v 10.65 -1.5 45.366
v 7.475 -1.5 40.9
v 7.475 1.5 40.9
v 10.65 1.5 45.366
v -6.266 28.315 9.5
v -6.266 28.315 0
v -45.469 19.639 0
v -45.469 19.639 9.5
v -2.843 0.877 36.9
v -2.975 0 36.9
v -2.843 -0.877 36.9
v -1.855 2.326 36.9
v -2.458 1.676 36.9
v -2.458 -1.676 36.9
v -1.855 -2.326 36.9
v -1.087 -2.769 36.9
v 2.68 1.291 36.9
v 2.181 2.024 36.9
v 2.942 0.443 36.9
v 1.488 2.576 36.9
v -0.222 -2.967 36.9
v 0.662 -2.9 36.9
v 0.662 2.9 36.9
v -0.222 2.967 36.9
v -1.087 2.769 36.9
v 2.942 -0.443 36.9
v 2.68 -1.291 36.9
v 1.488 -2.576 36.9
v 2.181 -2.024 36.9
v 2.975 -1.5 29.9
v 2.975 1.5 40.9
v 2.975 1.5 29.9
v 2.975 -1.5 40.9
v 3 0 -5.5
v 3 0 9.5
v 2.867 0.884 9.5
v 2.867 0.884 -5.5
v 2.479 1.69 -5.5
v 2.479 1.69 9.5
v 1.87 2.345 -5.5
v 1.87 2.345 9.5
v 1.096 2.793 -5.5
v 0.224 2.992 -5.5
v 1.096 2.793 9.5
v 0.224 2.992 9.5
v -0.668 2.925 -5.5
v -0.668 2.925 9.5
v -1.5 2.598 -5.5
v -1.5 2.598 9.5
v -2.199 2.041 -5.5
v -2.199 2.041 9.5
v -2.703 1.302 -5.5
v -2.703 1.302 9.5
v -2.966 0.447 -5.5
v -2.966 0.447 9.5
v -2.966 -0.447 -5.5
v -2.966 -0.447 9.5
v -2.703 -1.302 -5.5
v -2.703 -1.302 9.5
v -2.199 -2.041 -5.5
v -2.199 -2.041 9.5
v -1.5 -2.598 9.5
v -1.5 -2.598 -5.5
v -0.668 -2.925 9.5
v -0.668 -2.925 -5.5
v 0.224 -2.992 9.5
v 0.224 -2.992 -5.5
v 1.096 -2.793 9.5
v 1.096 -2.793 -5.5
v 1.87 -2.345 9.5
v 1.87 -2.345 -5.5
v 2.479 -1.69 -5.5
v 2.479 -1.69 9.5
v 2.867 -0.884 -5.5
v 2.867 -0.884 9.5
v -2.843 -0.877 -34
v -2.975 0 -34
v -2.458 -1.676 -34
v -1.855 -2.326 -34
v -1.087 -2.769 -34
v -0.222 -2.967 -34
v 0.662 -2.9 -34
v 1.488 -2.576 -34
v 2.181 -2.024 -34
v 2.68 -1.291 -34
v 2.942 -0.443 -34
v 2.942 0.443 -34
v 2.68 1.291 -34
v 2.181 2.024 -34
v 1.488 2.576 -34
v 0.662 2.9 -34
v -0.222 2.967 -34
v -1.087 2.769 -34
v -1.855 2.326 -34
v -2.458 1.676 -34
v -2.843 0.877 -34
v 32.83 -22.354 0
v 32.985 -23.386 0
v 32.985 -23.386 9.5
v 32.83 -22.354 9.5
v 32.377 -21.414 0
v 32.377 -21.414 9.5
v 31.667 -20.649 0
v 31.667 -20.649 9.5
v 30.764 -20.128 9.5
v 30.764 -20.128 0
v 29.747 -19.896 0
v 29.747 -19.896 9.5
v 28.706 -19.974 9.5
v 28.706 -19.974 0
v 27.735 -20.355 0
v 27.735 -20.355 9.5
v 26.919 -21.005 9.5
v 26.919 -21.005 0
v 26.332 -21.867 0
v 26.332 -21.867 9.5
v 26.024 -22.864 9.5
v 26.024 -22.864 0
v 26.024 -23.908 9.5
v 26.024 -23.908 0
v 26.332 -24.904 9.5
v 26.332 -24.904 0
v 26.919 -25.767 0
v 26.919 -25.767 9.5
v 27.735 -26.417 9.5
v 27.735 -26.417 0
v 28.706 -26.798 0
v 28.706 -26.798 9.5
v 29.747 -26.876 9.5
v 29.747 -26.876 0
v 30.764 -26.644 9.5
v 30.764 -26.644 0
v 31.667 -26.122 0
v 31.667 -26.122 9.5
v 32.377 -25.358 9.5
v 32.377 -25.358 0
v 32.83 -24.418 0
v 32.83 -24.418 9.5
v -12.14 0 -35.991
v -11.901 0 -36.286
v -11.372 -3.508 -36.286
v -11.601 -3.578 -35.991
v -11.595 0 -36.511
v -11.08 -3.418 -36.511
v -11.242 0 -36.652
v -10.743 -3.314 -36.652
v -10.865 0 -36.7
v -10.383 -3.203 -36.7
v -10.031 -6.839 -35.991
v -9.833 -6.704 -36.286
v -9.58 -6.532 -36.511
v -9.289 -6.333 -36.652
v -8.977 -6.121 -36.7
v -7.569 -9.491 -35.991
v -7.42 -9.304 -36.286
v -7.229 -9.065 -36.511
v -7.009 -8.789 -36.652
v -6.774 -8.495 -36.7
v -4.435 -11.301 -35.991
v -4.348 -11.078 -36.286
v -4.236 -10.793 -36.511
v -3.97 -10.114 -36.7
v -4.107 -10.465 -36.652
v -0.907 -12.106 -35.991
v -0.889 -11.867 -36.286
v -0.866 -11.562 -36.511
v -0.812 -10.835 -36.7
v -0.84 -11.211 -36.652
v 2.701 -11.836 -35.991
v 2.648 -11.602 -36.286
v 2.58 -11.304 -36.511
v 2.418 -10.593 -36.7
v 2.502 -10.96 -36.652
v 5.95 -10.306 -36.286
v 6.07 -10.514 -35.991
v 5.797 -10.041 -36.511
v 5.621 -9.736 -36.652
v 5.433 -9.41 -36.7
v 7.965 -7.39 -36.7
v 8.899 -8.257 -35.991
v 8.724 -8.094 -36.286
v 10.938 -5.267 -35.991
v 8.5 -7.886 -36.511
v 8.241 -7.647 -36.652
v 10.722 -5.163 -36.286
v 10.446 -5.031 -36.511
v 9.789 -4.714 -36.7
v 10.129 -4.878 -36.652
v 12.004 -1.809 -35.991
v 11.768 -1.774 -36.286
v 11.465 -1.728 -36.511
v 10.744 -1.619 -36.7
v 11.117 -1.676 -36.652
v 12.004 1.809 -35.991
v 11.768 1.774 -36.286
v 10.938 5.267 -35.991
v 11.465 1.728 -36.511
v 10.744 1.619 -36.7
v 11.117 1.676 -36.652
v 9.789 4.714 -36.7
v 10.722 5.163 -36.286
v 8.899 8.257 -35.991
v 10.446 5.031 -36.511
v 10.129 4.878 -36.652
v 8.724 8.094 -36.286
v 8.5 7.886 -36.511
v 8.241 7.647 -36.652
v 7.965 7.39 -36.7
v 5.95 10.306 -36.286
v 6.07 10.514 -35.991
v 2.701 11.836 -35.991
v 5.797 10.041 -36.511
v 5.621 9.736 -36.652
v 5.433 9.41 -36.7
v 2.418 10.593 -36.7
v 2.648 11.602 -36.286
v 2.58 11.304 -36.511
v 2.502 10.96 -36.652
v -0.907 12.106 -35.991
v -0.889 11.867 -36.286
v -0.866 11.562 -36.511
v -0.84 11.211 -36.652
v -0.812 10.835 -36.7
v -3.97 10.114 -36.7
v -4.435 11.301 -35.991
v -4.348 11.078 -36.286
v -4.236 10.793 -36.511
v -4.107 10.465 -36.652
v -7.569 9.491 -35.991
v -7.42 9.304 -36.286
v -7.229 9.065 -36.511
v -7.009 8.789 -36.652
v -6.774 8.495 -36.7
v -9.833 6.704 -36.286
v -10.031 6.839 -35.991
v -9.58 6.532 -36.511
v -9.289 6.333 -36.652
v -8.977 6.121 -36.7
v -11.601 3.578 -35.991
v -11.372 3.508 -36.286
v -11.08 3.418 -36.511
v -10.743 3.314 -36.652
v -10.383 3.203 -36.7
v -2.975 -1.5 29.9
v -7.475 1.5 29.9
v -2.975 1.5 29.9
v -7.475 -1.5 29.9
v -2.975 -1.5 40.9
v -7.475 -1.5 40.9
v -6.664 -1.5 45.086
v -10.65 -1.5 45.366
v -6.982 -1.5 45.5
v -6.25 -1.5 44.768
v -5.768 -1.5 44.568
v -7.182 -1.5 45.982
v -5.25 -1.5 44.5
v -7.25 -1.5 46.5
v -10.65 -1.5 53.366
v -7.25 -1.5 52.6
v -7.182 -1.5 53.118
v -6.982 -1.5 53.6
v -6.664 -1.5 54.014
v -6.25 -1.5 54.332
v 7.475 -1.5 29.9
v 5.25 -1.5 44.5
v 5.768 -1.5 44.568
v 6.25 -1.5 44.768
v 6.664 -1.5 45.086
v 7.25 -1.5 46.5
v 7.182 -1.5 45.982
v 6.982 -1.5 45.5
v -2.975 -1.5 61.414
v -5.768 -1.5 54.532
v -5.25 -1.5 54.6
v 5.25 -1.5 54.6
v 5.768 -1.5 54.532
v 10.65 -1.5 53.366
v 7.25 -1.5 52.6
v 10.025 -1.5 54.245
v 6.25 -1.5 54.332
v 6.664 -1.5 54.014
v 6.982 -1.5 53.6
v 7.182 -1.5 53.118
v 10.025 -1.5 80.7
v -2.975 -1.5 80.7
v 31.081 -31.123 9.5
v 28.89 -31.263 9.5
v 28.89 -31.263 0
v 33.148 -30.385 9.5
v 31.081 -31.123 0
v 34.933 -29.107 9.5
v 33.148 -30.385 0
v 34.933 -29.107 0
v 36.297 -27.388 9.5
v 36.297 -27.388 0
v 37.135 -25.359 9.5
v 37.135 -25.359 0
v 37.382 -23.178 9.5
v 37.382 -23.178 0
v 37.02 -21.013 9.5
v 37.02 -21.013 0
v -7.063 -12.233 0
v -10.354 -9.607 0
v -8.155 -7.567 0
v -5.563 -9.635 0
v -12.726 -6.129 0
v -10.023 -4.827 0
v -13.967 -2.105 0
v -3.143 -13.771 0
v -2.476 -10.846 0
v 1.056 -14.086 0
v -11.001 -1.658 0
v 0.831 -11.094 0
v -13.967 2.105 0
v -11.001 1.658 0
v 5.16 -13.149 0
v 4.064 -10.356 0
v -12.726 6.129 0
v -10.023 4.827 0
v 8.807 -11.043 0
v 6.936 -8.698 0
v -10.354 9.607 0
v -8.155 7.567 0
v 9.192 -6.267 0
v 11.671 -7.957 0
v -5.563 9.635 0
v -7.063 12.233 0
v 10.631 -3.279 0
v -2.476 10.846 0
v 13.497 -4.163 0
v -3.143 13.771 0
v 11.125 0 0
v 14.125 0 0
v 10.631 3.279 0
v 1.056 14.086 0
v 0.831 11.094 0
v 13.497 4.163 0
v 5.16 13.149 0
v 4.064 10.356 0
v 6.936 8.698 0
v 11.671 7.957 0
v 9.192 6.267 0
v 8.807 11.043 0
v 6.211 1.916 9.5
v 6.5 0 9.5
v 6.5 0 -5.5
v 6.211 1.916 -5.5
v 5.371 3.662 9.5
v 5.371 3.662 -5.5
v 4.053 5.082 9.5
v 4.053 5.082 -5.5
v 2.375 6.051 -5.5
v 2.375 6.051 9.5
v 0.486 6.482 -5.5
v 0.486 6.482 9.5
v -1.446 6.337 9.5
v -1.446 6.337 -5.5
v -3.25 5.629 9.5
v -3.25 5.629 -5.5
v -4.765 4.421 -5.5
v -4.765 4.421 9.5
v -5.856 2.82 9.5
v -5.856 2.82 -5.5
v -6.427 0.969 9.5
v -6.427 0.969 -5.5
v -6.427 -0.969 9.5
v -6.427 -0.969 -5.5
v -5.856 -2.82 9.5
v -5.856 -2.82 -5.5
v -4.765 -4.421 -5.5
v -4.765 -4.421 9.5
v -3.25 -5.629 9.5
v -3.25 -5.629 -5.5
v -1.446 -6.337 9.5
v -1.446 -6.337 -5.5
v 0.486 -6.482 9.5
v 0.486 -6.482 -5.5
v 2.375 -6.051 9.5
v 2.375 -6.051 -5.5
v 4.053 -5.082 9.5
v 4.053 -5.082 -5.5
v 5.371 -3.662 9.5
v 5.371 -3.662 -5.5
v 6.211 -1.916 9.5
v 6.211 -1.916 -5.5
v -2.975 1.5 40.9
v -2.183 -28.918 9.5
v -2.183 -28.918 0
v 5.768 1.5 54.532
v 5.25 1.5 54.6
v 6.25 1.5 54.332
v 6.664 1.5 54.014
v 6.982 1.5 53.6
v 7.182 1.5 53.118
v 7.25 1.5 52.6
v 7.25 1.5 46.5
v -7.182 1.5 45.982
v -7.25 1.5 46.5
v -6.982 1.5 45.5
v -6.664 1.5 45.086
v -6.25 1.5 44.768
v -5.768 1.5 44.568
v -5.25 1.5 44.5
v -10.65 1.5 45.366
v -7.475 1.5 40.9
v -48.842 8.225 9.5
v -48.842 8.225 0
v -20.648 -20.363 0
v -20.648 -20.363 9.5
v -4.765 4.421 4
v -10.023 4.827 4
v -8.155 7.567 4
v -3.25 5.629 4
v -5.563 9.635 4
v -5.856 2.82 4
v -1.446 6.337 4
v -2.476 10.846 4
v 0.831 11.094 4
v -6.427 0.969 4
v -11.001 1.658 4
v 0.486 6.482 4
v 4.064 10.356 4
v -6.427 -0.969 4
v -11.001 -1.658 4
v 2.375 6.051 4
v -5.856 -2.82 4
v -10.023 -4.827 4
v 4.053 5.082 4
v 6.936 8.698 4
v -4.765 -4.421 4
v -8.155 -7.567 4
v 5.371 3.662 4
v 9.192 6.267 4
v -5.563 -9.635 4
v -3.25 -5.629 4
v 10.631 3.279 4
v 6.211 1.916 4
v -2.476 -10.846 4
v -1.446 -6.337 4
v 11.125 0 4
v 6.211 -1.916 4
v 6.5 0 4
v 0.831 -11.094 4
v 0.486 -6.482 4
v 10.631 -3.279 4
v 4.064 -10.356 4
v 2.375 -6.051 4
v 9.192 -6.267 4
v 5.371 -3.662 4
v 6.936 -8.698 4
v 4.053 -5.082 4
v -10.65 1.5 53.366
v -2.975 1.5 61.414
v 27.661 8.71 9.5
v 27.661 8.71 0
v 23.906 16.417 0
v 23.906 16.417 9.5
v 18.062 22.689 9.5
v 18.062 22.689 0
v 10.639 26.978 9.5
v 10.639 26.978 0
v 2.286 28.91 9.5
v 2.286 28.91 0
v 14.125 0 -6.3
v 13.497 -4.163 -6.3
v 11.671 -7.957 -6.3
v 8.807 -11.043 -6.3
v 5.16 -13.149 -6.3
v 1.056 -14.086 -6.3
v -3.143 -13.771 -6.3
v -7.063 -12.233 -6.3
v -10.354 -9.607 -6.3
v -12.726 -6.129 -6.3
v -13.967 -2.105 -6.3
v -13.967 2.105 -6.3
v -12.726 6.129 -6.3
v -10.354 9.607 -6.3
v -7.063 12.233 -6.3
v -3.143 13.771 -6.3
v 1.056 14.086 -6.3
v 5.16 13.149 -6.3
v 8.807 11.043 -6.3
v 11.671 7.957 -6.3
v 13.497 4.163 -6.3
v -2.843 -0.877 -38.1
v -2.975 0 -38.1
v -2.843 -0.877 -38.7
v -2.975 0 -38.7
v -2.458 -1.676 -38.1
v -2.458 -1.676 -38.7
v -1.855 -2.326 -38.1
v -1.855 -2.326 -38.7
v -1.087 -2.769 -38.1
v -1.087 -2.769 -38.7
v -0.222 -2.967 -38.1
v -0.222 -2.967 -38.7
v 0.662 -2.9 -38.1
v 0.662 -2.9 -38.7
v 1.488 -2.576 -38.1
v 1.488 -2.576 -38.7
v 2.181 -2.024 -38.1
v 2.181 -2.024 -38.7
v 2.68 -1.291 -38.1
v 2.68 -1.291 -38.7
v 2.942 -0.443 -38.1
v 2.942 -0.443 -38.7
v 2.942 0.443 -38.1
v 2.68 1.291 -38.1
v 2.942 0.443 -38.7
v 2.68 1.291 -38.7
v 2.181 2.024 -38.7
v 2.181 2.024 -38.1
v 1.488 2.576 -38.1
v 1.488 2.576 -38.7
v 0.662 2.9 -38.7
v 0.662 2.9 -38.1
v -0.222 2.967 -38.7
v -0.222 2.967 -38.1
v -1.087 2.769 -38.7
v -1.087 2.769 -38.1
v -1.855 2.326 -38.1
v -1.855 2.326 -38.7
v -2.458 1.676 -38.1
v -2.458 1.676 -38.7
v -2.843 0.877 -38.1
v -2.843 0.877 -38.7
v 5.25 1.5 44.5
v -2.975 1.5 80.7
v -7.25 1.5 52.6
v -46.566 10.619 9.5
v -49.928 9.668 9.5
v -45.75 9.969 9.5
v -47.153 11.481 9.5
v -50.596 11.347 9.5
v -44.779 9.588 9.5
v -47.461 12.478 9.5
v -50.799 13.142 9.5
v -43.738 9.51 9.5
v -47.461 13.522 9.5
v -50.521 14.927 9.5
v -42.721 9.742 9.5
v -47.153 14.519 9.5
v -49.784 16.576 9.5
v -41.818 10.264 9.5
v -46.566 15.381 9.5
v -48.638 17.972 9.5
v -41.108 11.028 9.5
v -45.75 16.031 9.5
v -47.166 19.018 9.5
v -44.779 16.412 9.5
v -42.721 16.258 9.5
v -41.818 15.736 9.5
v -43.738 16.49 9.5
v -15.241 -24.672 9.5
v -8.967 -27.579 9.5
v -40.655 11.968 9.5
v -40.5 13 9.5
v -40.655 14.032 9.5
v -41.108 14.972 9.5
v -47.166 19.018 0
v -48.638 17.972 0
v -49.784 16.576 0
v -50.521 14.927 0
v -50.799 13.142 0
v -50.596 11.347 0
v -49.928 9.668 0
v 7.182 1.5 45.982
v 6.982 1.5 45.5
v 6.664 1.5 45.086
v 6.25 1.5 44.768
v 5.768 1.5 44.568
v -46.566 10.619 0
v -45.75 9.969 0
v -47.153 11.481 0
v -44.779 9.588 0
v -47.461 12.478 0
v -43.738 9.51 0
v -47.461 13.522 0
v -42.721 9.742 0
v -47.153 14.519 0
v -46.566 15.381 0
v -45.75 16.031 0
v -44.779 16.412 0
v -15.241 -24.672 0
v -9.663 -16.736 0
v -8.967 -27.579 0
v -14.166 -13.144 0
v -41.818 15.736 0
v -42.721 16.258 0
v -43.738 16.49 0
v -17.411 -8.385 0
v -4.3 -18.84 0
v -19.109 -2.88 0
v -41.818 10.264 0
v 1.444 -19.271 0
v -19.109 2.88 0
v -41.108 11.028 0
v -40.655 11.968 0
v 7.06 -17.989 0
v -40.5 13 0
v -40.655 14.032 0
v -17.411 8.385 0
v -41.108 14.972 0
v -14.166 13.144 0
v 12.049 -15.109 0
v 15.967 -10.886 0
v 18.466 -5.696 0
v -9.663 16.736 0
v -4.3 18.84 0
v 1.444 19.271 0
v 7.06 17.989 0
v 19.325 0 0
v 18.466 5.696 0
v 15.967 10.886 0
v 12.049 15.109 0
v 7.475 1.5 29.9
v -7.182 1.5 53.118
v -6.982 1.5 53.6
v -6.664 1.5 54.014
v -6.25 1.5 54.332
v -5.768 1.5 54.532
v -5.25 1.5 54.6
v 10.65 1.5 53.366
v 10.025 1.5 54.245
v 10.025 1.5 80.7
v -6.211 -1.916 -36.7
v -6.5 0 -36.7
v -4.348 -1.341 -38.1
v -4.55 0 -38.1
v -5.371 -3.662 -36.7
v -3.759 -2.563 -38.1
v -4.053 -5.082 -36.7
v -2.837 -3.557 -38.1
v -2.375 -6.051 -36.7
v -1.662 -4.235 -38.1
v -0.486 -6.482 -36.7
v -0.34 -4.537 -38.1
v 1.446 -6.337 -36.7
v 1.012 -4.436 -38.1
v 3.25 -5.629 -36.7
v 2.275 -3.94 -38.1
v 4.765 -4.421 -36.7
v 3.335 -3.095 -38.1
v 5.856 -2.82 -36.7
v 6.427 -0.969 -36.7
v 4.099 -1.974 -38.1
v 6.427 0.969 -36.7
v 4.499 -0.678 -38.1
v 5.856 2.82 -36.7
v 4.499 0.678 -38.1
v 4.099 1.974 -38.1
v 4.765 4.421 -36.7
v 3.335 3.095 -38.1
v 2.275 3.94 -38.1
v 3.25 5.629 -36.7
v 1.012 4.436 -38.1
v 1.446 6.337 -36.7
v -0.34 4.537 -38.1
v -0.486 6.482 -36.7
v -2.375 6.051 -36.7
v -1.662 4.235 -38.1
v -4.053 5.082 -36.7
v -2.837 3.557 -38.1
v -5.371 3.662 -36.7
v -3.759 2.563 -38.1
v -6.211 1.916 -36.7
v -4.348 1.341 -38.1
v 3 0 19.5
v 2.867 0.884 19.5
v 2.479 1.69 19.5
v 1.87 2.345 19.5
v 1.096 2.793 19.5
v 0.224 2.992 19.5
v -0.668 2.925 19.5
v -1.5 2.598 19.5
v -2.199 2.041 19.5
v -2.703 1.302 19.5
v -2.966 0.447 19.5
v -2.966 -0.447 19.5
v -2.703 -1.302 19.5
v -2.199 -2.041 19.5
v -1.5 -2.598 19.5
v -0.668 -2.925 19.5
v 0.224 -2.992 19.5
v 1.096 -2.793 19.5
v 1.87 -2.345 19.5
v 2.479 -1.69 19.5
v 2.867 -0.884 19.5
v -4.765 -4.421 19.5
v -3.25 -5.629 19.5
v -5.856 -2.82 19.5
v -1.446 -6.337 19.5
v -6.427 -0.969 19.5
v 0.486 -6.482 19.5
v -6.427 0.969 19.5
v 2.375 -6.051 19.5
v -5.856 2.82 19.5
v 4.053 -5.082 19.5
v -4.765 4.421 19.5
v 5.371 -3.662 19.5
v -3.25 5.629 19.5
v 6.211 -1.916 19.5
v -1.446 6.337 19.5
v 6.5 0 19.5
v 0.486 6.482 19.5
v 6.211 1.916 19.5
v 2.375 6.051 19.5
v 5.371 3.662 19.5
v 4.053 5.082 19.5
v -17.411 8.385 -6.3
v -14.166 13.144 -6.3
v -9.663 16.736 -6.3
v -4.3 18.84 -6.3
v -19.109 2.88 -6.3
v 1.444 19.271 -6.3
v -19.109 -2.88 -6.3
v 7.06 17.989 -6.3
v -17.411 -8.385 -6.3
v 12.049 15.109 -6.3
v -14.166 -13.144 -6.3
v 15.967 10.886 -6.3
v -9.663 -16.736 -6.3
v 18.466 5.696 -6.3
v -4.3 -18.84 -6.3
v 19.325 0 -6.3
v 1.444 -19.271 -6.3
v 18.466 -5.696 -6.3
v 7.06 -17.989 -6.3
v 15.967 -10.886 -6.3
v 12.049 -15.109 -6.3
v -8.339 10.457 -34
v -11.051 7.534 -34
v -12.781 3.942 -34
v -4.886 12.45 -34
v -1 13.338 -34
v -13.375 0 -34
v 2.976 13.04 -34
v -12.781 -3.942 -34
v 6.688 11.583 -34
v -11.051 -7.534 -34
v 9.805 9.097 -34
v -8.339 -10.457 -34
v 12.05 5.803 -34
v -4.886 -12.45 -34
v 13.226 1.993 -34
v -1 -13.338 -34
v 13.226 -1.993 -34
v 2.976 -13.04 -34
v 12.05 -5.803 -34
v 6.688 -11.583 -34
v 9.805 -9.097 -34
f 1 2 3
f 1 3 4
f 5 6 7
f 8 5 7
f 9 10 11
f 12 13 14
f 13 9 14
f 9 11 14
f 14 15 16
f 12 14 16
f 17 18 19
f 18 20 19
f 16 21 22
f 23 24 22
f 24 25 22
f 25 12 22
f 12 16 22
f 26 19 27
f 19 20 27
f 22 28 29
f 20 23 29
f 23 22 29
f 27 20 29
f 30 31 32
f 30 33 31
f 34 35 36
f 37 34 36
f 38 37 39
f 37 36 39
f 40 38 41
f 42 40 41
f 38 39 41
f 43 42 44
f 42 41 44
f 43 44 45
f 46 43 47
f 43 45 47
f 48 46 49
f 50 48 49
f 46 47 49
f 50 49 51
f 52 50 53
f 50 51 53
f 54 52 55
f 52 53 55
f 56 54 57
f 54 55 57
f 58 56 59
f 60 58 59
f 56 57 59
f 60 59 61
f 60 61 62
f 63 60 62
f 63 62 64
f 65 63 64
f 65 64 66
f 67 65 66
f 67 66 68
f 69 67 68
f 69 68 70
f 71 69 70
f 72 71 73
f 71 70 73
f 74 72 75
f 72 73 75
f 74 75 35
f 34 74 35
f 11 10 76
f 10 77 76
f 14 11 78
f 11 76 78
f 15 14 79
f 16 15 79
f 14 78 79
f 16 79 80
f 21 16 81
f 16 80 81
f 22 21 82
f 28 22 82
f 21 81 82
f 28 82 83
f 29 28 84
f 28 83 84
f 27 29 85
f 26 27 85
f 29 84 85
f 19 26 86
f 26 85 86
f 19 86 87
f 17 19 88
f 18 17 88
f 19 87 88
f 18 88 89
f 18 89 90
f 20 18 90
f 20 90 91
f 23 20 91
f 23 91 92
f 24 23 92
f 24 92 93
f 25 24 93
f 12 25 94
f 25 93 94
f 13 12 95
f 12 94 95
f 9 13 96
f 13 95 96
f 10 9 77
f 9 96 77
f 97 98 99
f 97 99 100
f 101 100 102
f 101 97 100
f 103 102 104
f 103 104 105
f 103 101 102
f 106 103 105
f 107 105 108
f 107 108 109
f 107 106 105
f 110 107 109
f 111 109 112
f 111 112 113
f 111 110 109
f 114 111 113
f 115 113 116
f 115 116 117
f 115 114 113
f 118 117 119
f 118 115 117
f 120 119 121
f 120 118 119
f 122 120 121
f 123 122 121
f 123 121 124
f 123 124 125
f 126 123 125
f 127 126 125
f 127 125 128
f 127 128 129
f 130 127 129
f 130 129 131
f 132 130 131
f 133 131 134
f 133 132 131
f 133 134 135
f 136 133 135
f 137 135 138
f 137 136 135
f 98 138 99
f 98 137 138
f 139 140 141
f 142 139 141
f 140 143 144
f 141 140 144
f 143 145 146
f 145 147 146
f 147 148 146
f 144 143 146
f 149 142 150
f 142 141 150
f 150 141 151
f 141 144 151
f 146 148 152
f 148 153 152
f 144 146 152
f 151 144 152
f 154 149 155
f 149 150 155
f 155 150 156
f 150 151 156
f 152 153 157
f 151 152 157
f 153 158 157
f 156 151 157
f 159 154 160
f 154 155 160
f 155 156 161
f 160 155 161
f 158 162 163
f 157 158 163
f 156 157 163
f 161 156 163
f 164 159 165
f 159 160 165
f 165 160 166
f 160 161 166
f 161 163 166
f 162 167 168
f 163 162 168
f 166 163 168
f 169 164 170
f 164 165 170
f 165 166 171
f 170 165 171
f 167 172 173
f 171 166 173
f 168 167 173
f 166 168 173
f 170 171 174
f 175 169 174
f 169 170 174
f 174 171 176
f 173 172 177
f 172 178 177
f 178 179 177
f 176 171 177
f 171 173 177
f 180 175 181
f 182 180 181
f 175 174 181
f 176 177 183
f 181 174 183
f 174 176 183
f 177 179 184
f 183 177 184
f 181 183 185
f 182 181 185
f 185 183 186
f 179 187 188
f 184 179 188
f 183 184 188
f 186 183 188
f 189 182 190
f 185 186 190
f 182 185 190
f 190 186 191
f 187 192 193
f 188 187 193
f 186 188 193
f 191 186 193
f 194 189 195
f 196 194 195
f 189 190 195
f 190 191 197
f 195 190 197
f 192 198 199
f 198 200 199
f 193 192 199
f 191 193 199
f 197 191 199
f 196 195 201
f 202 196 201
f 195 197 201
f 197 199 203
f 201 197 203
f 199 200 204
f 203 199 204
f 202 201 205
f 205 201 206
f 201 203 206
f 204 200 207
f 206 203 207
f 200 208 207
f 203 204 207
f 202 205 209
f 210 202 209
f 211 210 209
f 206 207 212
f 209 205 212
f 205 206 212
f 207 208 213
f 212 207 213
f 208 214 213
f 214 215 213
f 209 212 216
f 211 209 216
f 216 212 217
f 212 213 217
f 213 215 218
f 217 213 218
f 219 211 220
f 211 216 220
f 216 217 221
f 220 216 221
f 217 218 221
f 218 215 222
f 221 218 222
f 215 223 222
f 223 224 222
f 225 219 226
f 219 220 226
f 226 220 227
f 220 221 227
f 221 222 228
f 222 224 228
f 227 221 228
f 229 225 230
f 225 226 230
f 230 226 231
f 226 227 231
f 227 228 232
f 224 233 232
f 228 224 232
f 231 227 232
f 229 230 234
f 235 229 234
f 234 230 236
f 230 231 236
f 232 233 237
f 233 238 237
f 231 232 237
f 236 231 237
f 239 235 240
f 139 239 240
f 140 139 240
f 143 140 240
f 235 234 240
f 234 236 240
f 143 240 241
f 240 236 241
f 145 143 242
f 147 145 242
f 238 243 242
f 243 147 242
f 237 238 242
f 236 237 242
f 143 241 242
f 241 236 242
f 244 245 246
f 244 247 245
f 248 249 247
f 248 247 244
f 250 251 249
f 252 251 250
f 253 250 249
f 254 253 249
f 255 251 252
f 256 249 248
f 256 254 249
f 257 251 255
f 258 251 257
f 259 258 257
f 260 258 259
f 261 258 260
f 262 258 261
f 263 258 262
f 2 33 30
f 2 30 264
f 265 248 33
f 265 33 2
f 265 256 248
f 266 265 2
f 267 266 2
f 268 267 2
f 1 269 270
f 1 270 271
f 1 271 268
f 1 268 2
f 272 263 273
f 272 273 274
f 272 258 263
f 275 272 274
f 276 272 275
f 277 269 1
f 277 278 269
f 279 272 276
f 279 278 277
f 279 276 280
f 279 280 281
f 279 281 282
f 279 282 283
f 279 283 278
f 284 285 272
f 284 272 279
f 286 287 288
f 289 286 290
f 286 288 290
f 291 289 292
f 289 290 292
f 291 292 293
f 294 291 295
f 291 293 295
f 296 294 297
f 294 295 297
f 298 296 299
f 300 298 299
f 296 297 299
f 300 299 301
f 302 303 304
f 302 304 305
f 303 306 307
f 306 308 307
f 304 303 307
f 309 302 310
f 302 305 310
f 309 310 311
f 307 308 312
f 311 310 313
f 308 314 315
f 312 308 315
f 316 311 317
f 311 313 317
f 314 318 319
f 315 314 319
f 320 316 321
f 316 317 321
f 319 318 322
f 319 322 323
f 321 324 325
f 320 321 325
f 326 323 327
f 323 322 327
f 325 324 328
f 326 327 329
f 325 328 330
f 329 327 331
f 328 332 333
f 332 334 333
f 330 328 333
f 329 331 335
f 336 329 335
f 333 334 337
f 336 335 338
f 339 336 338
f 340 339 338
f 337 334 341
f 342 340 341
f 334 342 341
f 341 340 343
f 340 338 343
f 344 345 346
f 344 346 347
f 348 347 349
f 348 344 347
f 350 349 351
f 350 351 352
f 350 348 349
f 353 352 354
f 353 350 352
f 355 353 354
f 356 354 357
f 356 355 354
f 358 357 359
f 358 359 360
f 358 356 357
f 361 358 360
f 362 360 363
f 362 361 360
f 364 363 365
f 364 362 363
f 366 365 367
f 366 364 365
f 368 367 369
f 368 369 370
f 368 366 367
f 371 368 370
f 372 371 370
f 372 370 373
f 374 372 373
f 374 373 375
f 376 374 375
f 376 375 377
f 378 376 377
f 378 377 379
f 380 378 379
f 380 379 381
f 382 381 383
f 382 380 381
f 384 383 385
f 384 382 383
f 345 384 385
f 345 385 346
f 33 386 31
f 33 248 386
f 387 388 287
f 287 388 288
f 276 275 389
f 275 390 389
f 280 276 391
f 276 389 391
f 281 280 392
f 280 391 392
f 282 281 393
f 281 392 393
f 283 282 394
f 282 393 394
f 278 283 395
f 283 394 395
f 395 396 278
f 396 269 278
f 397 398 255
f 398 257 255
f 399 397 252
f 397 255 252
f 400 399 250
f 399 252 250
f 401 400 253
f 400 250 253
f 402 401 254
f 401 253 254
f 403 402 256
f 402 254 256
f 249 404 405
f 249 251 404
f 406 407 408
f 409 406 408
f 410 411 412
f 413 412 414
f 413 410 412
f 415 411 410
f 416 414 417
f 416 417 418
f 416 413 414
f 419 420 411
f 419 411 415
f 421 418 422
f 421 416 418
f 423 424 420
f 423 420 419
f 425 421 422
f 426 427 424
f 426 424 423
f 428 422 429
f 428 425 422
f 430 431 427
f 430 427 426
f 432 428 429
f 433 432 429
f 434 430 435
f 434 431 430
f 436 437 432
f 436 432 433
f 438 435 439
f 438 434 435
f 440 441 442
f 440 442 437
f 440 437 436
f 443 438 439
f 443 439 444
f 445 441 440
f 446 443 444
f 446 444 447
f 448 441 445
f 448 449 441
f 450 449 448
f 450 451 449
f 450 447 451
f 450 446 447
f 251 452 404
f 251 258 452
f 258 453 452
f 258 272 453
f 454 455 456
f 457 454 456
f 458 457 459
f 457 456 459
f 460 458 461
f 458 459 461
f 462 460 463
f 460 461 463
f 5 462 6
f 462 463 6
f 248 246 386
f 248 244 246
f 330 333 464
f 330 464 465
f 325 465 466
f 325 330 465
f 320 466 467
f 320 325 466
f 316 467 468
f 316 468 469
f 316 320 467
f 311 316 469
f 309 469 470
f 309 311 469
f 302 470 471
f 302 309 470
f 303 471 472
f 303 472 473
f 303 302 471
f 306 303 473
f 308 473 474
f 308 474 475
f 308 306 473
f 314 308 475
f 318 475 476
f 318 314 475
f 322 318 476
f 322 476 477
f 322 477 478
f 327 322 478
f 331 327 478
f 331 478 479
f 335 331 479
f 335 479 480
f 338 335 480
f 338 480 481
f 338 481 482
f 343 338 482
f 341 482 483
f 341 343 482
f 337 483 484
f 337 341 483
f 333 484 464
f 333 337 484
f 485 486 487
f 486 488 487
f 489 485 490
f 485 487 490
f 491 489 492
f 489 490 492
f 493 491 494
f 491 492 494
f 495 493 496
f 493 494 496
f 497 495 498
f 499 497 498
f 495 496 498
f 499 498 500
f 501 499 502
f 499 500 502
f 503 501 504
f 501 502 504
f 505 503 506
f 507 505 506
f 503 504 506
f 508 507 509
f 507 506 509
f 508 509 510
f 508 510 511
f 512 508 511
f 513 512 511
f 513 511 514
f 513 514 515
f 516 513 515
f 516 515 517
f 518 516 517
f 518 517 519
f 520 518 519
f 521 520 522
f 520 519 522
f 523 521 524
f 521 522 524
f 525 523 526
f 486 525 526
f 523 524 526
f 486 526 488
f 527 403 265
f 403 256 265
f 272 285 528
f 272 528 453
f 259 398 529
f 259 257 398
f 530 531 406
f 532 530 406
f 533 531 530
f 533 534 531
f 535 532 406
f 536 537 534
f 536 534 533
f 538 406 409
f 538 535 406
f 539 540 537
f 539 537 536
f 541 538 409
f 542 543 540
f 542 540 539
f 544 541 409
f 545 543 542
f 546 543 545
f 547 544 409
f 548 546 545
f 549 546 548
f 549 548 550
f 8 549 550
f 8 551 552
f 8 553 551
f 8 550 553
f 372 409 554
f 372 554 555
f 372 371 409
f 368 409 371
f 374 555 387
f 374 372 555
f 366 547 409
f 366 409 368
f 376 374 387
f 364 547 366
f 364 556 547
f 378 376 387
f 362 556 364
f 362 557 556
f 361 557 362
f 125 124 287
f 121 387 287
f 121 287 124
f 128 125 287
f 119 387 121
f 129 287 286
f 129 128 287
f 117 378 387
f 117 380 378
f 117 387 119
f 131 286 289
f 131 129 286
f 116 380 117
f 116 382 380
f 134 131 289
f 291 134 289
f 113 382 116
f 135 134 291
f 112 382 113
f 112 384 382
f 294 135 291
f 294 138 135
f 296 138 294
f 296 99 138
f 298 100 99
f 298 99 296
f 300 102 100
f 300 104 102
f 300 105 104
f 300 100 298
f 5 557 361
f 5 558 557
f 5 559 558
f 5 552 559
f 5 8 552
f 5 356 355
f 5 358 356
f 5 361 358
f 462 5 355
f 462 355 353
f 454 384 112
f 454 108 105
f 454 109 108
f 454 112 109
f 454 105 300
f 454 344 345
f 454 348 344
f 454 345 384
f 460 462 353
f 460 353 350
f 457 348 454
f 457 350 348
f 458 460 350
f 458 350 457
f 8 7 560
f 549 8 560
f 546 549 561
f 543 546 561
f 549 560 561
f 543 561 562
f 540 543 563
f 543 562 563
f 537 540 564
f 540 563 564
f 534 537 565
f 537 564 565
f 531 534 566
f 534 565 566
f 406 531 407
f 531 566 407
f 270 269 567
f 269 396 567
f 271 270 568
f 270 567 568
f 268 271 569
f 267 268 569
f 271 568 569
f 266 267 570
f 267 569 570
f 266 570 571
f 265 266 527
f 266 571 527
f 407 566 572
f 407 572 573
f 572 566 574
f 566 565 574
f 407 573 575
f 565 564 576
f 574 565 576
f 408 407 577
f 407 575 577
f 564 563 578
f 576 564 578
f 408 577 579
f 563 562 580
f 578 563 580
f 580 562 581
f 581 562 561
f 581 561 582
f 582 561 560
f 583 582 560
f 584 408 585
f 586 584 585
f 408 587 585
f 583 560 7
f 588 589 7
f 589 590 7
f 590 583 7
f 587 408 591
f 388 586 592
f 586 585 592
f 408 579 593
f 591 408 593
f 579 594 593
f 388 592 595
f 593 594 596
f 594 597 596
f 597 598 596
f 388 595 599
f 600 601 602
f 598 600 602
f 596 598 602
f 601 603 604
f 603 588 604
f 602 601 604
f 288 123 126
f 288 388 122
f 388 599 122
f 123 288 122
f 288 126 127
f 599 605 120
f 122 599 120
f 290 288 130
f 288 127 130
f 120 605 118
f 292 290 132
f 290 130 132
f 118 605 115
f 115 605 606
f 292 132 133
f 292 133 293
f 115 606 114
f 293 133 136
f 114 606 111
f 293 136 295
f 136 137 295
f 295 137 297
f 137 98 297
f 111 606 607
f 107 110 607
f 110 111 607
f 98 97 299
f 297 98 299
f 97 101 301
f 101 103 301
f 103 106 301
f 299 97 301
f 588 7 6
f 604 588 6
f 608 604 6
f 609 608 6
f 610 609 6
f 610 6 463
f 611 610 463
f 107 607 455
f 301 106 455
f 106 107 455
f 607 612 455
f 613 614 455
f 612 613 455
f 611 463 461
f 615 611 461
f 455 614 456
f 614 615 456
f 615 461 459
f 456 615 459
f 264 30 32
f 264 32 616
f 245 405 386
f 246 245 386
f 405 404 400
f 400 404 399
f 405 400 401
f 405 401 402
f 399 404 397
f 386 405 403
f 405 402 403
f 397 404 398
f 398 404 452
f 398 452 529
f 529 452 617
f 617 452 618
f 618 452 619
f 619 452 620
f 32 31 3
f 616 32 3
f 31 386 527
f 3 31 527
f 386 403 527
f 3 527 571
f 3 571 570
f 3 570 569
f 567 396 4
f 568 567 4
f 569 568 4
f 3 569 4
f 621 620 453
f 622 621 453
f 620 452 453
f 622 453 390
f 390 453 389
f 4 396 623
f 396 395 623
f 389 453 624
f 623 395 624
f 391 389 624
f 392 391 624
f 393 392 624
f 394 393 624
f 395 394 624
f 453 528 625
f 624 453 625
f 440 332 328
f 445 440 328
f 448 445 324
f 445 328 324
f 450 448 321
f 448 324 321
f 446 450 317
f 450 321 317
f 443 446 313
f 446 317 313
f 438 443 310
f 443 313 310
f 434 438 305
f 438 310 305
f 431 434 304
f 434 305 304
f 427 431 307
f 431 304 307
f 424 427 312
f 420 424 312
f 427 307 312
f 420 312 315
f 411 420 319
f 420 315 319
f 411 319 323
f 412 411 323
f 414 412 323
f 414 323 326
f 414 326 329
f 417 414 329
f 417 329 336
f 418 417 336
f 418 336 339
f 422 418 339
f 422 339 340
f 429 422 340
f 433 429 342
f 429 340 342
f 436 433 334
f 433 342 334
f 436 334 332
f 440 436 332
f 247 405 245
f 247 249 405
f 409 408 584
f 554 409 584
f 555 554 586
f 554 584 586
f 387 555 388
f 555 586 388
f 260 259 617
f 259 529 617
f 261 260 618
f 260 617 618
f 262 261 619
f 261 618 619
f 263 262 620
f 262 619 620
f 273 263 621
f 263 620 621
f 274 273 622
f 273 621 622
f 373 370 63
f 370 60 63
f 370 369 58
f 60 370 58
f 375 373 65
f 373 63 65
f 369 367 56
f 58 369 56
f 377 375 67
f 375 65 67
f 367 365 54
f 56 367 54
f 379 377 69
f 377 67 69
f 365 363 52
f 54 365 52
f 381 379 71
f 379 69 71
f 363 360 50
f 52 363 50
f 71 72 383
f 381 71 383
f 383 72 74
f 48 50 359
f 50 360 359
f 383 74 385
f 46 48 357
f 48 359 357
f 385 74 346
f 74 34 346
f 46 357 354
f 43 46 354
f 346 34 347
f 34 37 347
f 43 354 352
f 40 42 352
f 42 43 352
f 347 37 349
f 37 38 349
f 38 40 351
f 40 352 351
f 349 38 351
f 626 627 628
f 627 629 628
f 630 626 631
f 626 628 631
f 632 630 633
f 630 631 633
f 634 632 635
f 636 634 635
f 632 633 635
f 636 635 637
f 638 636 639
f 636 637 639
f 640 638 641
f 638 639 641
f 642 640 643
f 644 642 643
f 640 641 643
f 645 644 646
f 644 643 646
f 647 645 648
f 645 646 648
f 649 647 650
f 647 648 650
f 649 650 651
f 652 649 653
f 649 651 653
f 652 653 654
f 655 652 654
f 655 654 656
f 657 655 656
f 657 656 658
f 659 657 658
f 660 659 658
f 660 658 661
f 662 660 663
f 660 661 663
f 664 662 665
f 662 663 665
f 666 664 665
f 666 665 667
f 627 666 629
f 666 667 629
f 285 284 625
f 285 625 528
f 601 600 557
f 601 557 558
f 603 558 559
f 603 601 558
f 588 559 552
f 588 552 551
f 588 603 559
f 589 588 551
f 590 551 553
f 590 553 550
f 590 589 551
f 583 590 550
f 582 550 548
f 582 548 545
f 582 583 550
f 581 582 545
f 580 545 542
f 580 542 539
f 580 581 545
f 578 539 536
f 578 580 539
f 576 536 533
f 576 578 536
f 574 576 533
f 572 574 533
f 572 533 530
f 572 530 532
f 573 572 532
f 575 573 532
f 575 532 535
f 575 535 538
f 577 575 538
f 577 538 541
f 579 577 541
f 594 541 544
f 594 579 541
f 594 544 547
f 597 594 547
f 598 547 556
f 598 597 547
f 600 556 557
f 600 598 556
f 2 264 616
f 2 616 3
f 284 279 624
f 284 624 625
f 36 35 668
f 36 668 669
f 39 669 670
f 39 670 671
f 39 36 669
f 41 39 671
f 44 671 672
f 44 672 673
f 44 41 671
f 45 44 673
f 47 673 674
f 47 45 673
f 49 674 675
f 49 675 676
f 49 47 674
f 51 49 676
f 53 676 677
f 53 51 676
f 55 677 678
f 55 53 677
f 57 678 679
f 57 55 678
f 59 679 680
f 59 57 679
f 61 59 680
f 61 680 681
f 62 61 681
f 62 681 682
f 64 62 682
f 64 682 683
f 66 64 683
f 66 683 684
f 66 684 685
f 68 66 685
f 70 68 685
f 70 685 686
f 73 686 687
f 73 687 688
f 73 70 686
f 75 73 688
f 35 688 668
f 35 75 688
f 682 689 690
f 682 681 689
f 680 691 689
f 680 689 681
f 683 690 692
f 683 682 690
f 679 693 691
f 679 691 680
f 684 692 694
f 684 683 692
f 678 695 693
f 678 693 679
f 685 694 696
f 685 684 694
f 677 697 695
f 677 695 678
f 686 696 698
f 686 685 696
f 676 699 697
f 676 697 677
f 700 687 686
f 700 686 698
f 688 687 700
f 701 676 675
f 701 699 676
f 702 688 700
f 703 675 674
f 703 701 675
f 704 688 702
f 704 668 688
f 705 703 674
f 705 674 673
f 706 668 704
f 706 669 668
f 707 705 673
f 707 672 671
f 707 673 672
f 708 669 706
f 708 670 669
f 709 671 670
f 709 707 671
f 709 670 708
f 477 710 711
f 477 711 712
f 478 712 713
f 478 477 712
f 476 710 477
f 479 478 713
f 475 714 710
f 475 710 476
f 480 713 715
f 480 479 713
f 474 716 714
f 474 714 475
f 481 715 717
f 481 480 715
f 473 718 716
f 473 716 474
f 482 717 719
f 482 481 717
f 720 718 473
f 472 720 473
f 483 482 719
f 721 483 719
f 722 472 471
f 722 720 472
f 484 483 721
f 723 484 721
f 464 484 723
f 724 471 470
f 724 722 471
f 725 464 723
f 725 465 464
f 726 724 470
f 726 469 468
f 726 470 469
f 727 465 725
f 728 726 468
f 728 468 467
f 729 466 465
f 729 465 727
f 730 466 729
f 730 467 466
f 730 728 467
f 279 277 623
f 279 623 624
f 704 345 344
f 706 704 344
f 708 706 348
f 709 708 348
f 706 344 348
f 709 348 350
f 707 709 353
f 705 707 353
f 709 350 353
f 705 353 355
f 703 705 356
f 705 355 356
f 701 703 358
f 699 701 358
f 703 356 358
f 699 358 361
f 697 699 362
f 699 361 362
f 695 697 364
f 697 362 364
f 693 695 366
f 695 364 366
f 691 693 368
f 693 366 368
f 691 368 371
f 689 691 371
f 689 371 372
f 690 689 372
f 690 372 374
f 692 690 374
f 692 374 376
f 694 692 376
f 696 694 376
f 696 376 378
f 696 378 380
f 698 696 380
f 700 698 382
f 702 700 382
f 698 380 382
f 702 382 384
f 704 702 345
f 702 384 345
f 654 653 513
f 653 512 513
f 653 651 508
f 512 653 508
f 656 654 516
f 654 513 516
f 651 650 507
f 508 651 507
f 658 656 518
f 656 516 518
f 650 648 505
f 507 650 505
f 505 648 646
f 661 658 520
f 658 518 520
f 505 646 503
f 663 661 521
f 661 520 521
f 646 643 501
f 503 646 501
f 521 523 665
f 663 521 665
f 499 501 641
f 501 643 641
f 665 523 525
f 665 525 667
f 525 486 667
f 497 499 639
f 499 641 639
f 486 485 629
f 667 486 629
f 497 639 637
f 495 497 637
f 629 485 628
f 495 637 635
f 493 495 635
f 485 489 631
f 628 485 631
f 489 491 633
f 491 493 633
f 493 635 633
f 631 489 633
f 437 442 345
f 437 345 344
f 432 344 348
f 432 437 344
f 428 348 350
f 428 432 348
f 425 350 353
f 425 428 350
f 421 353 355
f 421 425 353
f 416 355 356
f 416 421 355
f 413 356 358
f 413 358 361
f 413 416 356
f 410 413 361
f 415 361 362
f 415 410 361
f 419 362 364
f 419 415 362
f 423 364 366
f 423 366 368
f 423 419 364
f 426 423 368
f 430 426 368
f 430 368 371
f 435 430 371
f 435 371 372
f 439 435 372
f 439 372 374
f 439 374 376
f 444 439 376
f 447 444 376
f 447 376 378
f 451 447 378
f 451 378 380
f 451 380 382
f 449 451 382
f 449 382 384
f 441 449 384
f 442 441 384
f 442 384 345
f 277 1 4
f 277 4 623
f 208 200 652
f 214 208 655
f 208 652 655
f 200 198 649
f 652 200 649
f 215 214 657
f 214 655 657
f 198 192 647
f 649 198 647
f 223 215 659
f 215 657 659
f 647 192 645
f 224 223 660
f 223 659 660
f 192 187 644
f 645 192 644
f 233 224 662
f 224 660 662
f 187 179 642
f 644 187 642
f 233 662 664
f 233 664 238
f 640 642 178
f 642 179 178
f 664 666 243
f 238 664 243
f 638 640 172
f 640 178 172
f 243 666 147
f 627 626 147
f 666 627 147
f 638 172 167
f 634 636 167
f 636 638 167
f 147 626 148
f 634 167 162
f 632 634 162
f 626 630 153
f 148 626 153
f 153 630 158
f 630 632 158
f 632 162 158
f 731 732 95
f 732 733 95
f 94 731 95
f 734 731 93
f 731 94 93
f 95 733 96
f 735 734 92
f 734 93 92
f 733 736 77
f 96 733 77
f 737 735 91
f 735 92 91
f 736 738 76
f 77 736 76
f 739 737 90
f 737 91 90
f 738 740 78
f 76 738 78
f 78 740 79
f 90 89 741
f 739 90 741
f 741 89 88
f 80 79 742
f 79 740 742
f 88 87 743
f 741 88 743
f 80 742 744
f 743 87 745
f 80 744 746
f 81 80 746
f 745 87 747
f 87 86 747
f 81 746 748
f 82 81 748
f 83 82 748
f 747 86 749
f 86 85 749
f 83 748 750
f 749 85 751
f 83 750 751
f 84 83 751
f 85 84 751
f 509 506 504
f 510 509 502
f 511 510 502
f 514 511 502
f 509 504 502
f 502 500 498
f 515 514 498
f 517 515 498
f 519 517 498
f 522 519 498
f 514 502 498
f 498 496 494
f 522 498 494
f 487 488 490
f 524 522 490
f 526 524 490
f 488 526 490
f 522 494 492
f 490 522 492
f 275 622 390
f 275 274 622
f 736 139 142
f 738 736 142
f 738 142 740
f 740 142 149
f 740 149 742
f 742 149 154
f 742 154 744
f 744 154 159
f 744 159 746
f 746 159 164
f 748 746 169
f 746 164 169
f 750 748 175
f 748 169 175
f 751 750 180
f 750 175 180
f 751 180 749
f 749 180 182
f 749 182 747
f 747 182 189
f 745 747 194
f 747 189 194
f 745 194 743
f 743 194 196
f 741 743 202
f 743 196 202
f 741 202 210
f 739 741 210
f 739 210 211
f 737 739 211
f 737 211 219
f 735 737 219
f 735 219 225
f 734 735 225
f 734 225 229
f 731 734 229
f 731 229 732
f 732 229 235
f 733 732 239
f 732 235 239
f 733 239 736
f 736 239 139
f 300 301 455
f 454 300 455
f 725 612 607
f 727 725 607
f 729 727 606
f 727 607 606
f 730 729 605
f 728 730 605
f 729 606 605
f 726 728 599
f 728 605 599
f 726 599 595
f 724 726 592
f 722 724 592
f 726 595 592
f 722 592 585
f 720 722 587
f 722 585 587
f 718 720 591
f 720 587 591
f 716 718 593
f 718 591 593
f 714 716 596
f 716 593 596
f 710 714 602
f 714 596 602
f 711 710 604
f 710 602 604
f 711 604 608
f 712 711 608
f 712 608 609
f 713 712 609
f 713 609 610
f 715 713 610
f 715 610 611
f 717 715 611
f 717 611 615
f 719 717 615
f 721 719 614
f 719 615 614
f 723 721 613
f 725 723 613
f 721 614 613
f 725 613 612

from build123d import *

# Parameters (mm, degrees)
F0_R          = 3.5
F0_R_2        = 6.5
F1_DEPTH      = 9.5
F2_R          = 19.325
F2_R_2        = 14.125
F3_DEPTH      = 6.3
F4_R          = 11.125
F5_DEPTH      = 4
F6_R          = 6.5
F6_R_2        = 3
F7_DEPTH      = 15
F7_DEPTH_BACK = 10
F10_R         = 1.5
F11_W         = 14.5
F11_H         = 10.1
F12_DEPTH     = 1.5
F13_R         = 2


with BuildPart() as f1:
    # F0 (on Top) → F1 (new body)
    with BuildSketch(Plane.XY):
        with BuildLine():
            Line((-6.2660353757, 28.31495719), (-45.4692772605, 19.6393692721))
            ThreePointArc((-45.4692772605, 19.6393692721), (-50.5213204148, 14.9267537589), (-48.8416396041, 8.2252198015))
            Line((-48.8416396041, 8.2252198015), (-20.6481688998, -20.3630331995))
            ThreePointArc((-20.6481688998, -20.3630331995), (-12.1906315945, -26.313276142), (-2.183023906, -28.9177178668))
            Line((-2.183023906, -28.9177178668), (28.8904588593, -31.2634823573))
            ThreePointArc((28.8904588593, -31.2634823573), (35.6746611406, -28.2950606187), (37.0204069292, -21.0131723688))
            Line((37.0204069292, -21.0131723688), (27.6610892621, 8.7100023441))
            ThreePointArc((27.6610892621, 8.7100023441), (14.5095019325, 25.1092483693), (-6.2660353757, 28.31495719))
        make_face()
        with Locations((29.485144682, -23.3858971453)):
            Circle(F0_R, mode=Mode.SUBTRACT)
        with Locations((-44, 13)):
            Circle(F0_R, mode=Mode.SUBTRACT)
        Circle(F0_R_2, mode=Mode.SUBTRACT)
    extrude(amount=F1_DEPTH)

    # F2 (on face) → F3 (join)
    with BuildSketch(Plane(origin=(0, 0, 0), x_dir=(1, 0, 0), z_dir=(0, 0, -1))):
        Circle(F2_R)
        Circle(F2_R_2, mode=Mode.SUBTRACT)
    extrude(amount=F3_DEPTH)

    # F4 (on face) → F5 (cut)
    with BuildSketch(Plane(origin=(0, 0, 0), x_dir=(1, 0, 0), z_dir=(0, 0, -1))):
        Circle(F4_R)
    extrude(amount=-F5_DEPTH, mode=Mode.SUBTRACT)


with BuildPart() as f7:
    # F6 (on face) → F7 (new body, two sides)
    with BuildSketch(Plane.XY.offset(9.5)) as f7_sk:
        Circle(F6_R)
        Circle(F6_R_2, mode=Mode.SUBTRACT)
    extrude(amount=-F7_DEPTH)
    extrude(f7_sk.sketch, amount=F7_DEPTH_BACK)


with BuildPart() as f9:
    # F8 (on Front) → F9 (revolve)
    with BuildSketch(Plane.XZ):
        Polygon((0, -38.7), (0, 36.9), (-2.975, 36.9), (-2.975, -34), (-13.375, -34), (-11.7, -36.7), (-6.5, -36.7), (-4.55, -38.1), (-2.975, -38.1), (-2.975, -38.7), align=None)
    revolve(axis=Axis((0, 0, -0.9), (0, 0, 1)))

    # F10
    f10_edges = [f9.edges().sort_by_distance(p)[0] for p in [
        (11.7, 0, -36.7),
    ]]
    fillet(f10_edges, radius=F10_R)


with BuildPart() as f12:
    # F11 (on Front) → F12 (new body, symmetric)
    with BuildSketch(Plane.XZ):
        Polygon((2.975, 40.9), (2.975, 29.9), (7.475, 29.9), (7.475, 40.9), (10.65, 45.3656328917), (10.65, 53.3656328917), (10.025, 54.2446944845), (10.025, 80.7), (-2.975, 80.7), (-2.975, 61.4144735986), (-10.65, 53.3656328917), (-10.65, 45.3656328917), (-7.475, 40.9), (-7.475, 29.9), (-2.975, 29.9), (-2.975, 40.9), align=None)
        with Locations((0, 49.55)):
            Rectangle(F11_W, F11_H, mode=Mode.SUBTRACT)
    extrude(amount=F12_DEPTH, both=True)

    # F13
    f13_edges = [f12.edges().sort_by_distance(p)[0] for p in [
        (7.25, 0, 54.6),
        (7.25, 0, 44.5),
        (-7.25, 0, 44.5),
        (-7.25, 0, 54.6),
    ]]
    fillet(f13_edges, radius=F13_R)


solid = Compound([f1.part, f7.part, f9.part, f12.part])
